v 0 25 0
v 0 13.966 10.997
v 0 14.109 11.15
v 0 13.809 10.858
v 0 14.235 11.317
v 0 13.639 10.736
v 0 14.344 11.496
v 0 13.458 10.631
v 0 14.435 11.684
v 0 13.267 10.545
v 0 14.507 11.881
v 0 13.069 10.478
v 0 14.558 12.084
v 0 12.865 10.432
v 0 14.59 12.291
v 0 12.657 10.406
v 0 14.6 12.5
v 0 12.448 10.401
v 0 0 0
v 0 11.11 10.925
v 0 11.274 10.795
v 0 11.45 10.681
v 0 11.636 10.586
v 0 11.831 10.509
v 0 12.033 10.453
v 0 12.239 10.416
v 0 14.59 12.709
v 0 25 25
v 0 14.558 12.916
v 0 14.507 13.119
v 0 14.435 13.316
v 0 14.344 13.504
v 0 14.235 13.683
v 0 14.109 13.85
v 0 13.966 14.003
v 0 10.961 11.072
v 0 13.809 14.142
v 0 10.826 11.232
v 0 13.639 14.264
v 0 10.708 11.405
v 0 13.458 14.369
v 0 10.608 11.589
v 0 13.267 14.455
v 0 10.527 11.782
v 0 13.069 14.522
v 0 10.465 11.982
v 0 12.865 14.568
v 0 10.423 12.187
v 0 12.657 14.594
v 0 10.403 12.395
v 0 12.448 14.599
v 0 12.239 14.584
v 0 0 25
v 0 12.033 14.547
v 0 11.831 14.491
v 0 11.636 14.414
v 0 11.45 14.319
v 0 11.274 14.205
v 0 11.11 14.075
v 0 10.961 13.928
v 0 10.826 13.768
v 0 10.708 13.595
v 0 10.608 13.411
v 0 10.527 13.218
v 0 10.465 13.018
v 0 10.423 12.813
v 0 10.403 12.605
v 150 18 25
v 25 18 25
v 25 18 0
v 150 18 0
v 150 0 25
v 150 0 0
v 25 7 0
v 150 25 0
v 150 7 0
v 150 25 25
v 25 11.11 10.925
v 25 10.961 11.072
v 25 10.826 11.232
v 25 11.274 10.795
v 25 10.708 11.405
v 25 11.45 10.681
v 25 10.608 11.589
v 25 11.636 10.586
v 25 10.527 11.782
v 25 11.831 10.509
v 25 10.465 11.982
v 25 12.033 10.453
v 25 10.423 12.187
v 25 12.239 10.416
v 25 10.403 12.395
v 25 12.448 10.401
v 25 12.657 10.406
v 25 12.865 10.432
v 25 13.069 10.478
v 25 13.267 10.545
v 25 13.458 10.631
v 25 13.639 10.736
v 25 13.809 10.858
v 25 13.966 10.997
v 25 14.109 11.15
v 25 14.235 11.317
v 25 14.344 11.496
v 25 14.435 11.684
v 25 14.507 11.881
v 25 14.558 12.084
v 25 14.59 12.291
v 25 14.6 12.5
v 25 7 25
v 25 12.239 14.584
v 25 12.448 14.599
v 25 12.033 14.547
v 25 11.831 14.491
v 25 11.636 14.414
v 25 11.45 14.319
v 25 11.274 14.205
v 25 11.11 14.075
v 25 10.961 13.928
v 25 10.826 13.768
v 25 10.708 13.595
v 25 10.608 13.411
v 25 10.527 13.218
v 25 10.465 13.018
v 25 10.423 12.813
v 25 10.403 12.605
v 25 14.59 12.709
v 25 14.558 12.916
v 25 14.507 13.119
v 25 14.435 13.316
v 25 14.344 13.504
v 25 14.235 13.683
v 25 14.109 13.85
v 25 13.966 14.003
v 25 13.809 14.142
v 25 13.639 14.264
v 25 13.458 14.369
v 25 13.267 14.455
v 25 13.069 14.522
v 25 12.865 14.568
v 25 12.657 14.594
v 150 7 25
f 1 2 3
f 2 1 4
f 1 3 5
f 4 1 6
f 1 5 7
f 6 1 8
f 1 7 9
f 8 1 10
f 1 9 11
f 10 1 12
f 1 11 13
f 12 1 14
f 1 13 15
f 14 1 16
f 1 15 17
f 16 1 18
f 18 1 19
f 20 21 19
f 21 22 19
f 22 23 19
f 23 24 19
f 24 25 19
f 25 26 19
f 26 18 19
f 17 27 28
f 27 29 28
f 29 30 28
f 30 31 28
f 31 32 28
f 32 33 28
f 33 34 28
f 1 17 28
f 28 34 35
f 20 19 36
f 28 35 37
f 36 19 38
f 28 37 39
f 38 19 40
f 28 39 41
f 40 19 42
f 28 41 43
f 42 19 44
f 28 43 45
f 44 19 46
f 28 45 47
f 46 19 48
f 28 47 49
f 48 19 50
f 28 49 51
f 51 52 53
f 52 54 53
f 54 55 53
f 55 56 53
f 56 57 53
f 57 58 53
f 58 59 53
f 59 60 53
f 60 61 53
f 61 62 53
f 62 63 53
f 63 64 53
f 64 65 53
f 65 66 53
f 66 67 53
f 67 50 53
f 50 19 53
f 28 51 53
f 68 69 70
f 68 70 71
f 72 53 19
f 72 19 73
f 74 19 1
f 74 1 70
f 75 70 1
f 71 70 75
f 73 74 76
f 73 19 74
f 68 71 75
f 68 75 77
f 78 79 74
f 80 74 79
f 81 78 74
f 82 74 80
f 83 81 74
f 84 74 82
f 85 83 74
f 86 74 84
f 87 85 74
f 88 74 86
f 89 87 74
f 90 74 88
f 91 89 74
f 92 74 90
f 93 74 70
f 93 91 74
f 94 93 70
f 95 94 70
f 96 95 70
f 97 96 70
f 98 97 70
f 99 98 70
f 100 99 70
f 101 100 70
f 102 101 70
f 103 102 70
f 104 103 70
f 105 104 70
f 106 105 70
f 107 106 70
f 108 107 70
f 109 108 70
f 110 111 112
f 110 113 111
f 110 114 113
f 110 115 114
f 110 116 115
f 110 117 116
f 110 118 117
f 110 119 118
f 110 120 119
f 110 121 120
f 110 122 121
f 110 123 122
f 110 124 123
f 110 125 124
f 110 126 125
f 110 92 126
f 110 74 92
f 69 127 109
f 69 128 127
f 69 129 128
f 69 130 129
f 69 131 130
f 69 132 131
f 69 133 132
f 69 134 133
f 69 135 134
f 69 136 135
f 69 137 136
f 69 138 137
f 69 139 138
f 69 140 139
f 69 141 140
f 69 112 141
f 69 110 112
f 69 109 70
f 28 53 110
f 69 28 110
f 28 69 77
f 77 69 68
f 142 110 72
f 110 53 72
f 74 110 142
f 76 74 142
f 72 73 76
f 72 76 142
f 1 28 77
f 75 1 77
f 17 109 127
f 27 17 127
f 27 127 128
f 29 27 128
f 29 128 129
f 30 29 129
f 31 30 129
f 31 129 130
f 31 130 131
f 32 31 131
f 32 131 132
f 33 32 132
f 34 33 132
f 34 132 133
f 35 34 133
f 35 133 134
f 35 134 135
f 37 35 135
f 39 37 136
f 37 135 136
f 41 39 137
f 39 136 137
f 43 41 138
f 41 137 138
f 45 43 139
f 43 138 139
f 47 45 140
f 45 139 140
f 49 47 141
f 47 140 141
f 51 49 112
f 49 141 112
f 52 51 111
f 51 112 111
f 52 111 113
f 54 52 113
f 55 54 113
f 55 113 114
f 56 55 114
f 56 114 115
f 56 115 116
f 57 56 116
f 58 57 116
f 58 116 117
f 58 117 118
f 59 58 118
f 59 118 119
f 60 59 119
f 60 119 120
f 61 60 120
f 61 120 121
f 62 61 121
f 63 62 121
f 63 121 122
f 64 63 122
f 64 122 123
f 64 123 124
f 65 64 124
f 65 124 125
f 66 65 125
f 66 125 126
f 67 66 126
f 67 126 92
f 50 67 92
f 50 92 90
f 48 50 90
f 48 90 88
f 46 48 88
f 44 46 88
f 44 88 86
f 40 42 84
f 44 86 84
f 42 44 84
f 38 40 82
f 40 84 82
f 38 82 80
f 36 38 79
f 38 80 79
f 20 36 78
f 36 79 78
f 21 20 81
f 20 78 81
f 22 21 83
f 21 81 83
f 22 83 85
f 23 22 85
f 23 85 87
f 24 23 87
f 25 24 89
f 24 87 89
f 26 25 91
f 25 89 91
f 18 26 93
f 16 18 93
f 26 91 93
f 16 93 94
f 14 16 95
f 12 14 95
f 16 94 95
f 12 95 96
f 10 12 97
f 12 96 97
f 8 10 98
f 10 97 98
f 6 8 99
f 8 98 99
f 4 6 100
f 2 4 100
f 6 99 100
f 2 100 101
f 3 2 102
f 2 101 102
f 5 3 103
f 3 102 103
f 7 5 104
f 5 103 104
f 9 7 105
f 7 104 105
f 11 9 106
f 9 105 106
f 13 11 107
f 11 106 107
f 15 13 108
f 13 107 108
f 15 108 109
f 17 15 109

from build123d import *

# Parameters (mm, degrees)
F0_W     = 150
F0_H     = 25
F1_DEPTH = 25
F2_W     = 125
F2_H     = 11
F3_DEPTH = 25.001
F5_D     = 4.2


with BuildPart() as f1:
    # F0 (on Front) → F1 (new body)
    with BuildSketch(Plane.XZ):
        with Locations((75, 12.5)):
            Rectangle(F0_W, F0_H)
    extrude(amount=-F1_DEPTH)

    # F2 (on face) → F3 (cut, through all)
    with BuildSketch(Plane.XY.offset(25)):
        with Locations((87.5, 12.5)):
            Rectangle(F2_W, F2_H)
    extrude(amount=-F3_DEPTH, mode=Mode.SUBTRACT)

    # F5 (through all)
    with Locations(Plane(origin=(0, 0, 0), x_dir=(0, -1, 0), z_dir=(-1, 0, 0))):
        with Locations((-12.5, 12.5)):
            Hole(F5_D / 2)


solid = f1.part
